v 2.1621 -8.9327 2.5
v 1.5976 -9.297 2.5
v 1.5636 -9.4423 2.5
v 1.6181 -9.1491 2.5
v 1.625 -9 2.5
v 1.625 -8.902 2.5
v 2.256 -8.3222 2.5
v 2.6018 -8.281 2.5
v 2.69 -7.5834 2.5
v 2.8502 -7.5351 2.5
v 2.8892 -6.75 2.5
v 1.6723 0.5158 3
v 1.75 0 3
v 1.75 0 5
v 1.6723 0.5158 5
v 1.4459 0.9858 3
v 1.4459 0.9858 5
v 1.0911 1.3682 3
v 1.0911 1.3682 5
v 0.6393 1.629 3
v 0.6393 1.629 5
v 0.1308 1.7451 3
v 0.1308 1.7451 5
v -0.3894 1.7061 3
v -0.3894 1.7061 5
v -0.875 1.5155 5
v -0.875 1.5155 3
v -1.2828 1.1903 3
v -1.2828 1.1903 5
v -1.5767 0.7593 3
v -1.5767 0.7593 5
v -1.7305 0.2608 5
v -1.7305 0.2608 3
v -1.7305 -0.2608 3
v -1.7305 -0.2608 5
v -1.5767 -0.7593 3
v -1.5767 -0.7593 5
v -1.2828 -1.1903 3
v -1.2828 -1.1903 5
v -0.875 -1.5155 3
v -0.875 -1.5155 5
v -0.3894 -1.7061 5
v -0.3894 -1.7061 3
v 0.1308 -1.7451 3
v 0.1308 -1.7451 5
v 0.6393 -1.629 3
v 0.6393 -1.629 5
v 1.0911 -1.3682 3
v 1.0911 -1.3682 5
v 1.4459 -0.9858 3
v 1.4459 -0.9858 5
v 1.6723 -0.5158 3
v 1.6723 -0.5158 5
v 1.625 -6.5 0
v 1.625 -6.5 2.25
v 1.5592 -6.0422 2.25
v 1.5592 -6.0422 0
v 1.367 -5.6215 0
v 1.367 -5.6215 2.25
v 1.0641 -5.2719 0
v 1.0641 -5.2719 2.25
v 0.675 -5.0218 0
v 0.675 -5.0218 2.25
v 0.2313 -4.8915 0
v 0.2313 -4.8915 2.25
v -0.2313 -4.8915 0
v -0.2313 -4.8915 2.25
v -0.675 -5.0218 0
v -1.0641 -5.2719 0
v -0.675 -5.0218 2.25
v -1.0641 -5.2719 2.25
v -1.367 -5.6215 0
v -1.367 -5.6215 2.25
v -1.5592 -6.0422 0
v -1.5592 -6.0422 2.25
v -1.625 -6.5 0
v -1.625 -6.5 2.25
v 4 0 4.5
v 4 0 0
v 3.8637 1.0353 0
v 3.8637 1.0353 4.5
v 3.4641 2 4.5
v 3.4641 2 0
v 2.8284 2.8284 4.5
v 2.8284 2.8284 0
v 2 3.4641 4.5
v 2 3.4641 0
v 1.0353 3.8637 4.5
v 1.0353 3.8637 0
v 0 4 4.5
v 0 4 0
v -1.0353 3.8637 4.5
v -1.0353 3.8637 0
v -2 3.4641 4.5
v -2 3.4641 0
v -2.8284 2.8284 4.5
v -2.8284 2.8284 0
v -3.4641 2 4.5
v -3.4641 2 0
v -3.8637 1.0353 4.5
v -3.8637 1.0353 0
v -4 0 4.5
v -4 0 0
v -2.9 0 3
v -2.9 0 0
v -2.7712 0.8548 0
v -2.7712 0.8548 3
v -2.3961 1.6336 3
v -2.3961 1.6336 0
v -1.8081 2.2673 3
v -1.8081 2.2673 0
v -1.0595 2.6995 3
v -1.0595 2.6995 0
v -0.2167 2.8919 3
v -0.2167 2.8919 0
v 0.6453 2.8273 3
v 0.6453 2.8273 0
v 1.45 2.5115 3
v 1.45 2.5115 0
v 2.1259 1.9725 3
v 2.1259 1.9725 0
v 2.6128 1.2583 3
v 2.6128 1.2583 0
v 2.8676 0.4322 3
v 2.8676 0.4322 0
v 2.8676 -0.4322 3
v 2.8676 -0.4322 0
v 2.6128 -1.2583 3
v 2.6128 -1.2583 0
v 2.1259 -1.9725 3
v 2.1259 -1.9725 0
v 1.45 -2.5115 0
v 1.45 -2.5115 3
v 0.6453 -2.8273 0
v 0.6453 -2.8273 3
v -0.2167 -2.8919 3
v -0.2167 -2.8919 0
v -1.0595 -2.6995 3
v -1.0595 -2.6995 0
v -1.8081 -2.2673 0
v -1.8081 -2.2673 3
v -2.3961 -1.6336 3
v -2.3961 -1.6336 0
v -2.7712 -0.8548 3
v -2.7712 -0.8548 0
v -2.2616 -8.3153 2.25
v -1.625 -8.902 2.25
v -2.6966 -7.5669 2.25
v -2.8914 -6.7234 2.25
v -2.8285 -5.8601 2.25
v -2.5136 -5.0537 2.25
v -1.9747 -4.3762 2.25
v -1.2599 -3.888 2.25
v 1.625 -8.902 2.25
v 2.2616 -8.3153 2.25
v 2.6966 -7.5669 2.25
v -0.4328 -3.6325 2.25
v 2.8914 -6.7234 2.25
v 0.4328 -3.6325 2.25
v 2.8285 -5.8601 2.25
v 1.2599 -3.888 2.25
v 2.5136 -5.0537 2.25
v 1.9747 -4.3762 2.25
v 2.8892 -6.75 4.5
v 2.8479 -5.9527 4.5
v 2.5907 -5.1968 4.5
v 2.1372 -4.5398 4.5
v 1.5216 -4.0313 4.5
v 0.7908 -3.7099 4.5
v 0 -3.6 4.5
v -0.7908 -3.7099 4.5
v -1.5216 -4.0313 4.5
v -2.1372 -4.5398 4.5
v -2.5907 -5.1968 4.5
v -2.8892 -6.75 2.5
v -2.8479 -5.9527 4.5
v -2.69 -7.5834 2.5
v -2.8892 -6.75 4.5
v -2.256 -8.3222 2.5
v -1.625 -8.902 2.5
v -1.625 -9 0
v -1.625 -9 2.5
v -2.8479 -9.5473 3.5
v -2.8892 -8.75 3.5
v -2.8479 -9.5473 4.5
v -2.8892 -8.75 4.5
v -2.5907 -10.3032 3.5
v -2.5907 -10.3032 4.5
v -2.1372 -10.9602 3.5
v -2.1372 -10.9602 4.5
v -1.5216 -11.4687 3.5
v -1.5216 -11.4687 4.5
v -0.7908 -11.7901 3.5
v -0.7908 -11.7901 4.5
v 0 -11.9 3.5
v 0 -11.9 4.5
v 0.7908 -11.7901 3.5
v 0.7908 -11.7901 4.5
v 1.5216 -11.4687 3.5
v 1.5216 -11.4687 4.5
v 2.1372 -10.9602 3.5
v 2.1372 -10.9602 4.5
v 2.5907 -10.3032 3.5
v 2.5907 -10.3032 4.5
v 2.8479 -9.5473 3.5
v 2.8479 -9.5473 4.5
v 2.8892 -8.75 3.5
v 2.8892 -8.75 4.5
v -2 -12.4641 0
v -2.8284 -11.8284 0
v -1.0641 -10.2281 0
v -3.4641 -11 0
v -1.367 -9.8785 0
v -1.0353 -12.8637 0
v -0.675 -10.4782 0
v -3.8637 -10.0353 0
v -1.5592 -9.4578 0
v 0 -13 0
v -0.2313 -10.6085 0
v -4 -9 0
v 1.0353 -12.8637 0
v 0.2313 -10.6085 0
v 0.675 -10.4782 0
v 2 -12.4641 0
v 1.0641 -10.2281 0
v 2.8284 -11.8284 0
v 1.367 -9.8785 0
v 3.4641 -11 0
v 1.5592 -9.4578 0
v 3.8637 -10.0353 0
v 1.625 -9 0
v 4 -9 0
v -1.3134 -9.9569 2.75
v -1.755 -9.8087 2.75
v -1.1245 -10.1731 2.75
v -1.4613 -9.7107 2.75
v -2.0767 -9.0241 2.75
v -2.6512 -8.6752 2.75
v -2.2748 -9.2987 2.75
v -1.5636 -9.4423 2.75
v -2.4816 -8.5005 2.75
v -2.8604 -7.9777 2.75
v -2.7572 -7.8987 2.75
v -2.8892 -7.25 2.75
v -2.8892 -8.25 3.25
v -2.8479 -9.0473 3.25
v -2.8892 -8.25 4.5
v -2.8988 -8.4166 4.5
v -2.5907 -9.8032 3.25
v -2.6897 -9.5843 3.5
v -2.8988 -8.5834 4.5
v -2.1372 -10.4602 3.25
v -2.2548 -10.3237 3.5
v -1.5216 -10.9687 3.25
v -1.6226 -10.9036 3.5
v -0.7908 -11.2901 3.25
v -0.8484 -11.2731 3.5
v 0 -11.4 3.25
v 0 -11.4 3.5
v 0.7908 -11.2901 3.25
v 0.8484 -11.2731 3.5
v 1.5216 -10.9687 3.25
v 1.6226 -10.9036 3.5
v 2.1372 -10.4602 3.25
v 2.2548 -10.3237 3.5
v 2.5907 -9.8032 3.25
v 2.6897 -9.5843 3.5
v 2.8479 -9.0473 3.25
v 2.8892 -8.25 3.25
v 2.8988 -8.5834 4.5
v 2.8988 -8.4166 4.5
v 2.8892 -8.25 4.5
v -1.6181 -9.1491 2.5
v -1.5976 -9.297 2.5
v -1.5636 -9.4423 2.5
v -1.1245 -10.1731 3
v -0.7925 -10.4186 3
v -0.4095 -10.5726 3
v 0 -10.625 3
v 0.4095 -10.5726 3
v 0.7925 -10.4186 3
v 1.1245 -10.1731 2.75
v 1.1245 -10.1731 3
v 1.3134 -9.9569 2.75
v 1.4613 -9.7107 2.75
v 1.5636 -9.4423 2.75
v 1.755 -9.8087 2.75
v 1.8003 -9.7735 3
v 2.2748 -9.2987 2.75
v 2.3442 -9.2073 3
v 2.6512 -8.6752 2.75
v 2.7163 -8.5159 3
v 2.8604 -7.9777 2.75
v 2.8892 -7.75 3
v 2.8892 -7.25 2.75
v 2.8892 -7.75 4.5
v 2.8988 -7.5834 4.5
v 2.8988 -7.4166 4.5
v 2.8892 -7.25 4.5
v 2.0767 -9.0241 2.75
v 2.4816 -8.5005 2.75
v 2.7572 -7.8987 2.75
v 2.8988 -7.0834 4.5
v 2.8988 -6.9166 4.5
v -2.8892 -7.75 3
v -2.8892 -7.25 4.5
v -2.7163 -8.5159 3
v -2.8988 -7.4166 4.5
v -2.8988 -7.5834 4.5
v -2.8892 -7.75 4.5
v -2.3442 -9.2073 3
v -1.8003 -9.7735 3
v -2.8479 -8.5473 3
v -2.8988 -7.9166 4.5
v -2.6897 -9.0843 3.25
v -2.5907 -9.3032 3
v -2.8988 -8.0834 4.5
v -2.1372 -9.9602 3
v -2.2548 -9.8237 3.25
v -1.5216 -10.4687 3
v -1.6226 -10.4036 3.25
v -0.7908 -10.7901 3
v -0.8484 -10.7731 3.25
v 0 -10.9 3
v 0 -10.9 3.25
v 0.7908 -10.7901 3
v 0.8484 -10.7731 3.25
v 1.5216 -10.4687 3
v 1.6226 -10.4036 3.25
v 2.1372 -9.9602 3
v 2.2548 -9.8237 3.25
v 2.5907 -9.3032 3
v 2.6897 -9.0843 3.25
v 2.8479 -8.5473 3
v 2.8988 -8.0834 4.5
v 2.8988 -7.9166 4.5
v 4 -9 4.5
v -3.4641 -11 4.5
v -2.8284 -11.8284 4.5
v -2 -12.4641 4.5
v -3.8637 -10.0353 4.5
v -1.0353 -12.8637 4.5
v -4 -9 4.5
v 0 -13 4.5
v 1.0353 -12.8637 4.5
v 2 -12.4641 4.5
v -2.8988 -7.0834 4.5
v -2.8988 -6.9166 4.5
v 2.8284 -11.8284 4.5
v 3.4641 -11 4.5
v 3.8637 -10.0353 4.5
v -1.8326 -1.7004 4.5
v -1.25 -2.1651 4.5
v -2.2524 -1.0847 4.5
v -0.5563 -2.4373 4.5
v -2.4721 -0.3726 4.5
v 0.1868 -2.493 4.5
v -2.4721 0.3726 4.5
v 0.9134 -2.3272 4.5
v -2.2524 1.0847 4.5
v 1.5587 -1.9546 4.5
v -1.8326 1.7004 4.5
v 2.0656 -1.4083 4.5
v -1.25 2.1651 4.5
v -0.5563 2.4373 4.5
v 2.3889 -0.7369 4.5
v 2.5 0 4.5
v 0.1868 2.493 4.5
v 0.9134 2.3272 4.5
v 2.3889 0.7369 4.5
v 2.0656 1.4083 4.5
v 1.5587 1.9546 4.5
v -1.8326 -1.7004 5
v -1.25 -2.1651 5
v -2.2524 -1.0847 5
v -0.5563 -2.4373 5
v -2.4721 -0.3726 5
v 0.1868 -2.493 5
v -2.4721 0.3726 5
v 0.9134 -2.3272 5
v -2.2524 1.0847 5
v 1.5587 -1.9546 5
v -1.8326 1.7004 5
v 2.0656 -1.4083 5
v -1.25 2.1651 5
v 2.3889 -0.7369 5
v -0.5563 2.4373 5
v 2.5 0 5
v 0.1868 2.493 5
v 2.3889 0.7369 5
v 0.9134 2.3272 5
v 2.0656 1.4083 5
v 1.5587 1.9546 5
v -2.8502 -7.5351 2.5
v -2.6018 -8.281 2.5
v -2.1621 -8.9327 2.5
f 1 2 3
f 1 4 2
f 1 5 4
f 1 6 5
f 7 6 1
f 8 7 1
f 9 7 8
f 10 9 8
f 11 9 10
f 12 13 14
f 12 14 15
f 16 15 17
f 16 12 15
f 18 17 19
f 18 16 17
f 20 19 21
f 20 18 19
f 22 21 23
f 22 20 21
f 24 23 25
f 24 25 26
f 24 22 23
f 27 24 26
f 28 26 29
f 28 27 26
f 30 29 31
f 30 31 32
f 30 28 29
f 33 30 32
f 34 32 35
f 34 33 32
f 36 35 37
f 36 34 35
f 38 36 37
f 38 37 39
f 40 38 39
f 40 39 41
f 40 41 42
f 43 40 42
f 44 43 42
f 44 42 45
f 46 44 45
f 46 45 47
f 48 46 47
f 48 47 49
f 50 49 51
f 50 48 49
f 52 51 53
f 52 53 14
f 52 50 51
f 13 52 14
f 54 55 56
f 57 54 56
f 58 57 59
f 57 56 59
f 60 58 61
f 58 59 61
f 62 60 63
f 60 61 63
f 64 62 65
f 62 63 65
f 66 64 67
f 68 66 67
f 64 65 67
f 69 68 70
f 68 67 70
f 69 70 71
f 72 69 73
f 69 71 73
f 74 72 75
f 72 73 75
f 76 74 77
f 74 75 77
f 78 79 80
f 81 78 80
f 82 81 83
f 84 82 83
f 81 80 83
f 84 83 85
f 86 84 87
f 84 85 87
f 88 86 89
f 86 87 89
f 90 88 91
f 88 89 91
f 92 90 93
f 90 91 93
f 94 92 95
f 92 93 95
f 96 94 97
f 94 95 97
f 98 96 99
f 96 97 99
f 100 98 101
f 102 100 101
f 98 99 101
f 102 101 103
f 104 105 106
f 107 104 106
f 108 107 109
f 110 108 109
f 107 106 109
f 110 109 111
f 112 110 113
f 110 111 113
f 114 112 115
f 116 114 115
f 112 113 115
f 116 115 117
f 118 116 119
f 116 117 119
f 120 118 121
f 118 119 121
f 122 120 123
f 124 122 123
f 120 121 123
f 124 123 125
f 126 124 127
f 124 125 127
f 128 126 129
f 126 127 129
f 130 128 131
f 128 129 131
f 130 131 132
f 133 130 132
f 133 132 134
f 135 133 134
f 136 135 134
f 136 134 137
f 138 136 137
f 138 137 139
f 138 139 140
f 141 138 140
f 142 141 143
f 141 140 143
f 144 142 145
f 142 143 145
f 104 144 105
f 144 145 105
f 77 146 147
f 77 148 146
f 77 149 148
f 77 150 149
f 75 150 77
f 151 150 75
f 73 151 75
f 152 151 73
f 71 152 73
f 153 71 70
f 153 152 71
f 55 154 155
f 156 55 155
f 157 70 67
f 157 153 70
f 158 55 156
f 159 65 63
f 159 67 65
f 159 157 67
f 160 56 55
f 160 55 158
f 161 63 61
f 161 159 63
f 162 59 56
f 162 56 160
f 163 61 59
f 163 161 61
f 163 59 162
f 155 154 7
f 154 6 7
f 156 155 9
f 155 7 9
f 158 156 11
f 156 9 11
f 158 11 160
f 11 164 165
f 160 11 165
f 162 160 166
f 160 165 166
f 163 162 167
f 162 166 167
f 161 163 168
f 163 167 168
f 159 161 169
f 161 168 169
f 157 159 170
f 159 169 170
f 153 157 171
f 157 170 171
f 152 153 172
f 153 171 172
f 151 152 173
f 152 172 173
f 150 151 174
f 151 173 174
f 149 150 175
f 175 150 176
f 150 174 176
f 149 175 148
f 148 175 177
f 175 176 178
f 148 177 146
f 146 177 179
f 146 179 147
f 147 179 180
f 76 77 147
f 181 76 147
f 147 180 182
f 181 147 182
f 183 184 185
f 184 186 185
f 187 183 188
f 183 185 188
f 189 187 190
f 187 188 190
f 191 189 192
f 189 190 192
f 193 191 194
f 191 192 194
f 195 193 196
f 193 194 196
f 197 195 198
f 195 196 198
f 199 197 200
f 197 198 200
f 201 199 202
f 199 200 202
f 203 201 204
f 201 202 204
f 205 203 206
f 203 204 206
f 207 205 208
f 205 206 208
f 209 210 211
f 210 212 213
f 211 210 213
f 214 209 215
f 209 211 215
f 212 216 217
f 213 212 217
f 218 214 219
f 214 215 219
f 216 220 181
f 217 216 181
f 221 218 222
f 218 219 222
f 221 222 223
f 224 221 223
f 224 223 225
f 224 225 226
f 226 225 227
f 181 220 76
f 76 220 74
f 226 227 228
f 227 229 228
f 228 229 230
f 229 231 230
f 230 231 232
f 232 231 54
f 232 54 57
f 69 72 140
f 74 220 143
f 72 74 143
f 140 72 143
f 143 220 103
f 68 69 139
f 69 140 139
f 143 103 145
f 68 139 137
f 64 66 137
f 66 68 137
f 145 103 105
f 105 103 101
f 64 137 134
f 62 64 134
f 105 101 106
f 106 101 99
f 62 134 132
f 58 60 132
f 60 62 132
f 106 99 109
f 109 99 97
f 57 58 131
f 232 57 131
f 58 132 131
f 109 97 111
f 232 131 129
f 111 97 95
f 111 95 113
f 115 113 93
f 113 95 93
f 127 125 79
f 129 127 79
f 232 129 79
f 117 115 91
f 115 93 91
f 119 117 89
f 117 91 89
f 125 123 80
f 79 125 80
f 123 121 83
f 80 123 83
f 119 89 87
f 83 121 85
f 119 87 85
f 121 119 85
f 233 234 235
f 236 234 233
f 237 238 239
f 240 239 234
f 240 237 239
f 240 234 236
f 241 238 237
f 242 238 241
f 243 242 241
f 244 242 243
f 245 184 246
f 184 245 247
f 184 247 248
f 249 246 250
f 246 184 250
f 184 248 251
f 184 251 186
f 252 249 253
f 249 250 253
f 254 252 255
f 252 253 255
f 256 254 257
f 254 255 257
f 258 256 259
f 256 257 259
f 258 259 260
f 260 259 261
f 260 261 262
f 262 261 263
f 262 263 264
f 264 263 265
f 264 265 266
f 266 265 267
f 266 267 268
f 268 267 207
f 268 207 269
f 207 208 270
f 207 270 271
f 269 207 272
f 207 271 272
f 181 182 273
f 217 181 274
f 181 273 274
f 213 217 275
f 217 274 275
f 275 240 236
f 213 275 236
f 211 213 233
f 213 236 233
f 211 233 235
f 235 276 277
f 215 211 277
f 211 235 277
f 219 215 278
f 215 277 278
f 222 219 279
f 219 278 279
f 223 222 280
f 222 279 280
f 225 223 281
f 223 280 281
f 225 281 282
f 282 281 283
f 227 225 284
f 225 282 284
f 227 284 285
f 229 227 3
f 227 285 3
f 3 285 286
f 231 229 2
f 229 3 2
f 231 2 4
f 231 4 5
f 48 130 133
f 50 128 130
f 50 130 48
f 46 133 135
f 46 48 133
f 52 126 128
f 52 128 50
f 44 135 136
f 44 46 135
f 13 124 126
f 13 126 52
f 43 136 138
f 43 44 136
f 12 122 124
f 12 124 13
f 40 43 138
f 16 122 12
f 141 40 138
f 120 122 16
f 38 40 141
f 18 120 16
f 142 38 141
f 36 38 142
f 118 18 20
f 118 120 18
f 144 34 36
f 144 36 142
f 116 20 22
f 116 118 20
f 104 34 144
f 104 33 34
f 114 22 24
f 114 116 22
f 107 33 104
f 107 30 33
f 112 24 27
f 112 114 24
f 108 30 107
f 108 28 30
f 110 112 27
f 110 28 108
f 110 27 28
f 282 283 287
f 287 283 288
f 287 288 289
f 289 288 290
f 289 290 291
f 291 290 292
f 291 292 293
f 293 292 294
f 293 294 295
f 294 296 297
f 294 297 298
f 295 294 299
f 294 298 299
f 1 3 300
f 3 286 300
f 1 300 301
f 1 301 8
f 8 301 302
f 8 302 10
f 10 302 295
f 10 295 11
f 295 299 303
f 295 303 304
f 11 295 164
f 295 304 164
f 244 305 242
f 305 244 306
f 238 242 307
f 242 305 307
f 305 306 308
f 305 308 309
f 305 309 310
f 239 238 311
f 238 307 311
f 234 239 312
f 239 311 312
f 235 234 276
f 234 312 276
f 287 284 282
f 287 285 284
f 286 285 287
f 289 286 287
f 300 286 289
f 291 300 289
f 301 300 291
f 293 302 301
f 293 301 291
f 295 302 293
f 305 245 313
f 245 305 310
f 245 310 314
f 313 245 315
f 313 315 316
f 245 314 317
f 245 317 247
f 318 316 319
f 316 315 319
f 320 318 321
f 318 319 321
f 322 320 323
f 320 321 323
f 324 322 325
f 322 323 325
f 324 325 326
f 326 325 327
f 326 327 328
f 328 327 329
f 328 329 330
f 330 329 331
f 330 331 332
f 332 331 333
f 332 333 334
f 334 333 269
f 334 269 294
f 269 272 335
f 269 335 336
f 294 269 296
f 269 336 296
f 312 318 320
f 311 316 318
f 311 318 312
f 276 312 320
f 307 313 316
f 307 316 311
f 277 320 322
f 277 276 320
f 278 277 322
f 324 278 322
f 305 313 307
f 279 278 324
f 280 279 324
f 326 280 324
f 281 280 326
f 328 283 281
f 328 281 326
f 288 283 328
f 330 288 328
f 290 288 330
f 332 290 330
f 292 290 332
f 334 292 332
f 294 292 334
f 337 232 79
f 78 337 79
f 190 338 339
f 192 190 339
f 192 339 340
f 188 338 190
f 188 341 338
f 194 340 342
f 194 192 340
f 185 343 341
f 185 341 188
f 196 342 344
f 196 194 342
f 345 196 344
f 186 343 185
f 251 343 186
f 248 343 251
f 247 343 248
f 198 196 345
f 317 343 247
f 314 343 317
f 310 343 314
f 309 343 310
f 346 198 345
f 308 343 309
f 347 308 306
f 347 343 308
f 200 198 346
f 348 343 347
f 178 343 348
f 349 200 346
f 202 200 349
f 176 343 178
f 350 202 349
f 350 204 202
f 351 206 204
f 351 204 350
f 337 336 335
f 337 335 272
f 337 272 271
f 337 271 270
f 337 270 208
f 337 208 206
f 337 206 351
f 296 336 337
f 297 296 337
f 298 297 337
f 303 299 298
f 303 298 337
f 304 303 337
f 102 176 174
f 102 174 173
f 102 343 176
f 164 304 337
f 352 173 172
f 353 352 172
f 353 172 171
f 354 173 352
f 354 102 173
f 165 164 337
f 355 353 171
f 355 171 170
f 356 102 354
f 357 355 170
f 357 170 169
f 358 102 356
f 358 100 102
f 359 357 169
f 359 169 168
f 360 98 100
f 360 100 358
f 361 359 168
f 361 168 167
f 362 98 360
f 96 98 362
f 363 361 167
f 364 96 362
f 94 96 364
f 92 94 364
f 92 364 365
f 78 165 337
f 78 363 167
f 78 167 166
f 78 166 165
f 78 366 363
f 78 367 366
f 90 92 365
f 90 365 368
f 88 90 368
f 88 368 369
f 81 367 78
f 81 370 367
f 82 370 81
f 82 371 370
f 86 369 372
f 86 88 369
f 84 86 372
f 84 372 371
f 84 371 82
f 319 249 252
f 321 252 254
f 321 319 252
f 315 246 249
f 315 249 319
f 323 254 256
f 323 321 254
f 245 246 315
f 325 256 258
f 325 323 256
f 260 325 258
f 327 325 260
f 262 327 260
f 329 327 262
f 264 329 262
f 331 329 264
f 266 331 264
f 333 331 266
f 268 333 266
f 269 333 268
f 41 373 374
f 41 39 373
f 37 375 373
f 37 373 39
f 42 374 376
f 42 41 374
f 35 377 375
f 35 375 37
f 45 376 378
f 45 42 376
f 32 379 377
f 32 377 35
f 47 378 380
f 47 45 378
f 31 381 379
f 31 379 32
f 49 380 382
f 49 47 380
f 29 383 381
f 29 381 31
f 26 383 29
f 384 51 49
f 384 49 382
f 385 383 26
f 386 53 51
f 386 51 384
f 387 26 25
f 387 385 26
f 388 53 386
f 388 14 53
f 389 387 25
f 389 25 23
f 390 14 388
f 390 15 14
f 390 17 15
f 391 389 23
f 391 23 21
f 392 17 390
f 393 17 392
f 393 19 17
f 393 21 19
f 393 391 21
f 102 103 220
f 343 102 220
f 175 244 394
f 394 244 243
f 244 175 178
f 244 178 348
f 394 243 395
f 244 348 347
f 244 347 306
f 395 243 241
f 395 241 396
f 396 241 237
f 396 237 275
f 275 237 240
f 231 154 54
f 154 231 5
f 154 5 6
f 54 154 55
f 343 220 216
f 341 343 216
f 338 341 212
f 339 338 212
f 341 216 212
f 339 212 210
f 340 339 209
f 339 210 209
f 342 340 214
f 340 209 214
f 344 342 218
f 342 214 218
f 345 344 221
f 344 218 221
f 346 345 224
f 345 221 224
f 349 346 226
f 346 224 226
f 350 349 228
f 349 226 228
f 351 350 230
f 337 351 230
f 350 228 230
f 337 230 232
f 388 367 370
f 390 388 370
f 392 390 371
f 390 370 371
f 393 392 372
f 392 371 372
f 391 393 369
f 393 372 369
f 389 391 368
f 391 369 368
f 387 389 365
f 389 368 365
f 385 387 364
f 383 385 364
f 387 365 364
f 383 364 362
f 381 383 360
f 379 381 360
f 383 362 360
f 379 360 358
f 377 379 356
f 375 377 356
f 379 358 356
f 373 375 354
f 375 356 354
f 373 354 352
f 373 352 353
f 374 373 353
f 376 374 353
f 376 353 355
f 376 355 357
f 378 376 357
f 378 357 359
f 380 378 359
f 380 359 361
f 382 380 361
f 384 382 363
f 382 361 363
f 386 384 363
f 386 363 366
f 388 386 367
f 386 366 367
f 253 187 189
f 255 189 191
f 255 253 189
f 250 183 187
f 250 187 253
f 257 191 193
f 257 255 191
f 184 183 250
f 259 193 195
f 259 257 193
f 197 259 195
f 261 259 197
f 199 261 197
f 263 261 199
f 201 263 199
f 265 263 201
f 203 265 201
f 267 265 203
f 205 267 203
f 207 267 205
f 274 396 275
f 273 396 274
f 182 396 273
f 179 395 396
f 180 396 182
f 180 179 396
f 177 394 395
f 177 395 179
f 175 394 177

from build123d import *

# Parameters (mm, degrees)
ESBO_O1_R                = 1.75
RESSALTO_EXTRUS_O1_DEPTH = 4.5
ESBO_O2_R                = 2.5
ESBO_O2_R_2              = 1.75
RESSALTO_EXTRUS_O2_DEPTH = 0.5
CORTE_EXTRUS_O1_DEPTH    = 15.326548782
ESBO_O4_R                = 2.9
CORTE_EXTRUS_O2_DEPTH    = 1
ESBO_O5_R                = 2.9
CORTE_EXTRUS_O3_DEPTH    = 1.25
ESBO_O6_R                = 2.9
CORTE_EXTRUS_O4_DEPTH    = 1.5
ESBO_O7_R                = 2.9
CORTE_EXTRUS_O5_DEPTH    = 1.75
ESBO_O8_R                = 2.9
CORTE_EXTRUS_O6_DEPTH    = 2
ESBO_O9_R                = 2.9
CORTE_EXTRUS_O7_DEPTH    = 2.25
ESBO_O10_R               = 2.9
CORTE_EXTRUS_O8_DEPTH    = 3


with BuildPart() as part:
    # Esboço1 → Ressalto-extrusão1 (new body)
    with BuildSketch(Plane.XY):
        with BuildLine():
            Line((-4, 0), (-4, -9))
            ThreePointArc((-4, -9), (0, -13), (4, -9))
            Line((4, -9), (4, 0))
            ThreePointArc((4, 0), (0, 4), (-4, 0))
        make_face()
        Circle(ESBO_O1_R, mode=Mode.SUBTRACT)
    extrude(amount=RESSALTO_EXTRUS_O1_DEPTH)

    # Esboço2 → Ressalto-extrusão2 (add)
    with BuildSketch(Plane.XY.offset(4.5)):
        Circle(ESBO_O2_R)
        Circle(ESBO_O2_R_2, mode=Mode.SUBTRACT)
    extrude(amount=RESSALTO_EXTRUS_O2_DEPTH)

    # Esboço3 → Corte-extrusão1 (cut, through all)
    with BuildSketch(Plane.XY.offset(4.5)):
        with BuildLine():
            Line((-1.625, -6.5), (-1.625, -9))
            ThreePointArc((-1.625, -9), (0, -10.625), (1.625, -9))
            Line((1.625, -9), (1.625, -6.5))
            ThreePointArc((1.625, -6.5), (0, -4.875), (-1.625, -6.5))
        make_face()
    extrude(amount=-CORTE_EXTRUS_O1_DEPTH, mode=Mode.SUBTRACT)

    # Esboço4 → Corte-extrusão2 (cut)
    with BuildSketch(Plane.XY.offset(4.5)):
        with Locations((0, -9)):
            Circle(ESBO_O4_R)
    extrude(amount=-CORTE_EXTRUS_O2_DEPTH, mode=Mode.SUBTRACT)

    # Esboço5 → Corte-extrusão3 (cut)
    with BuildSketch(Plane.XY.offset(4.5)):
        with Locations((0, -8.5)):
            Circle(ESBO_O5_R)
    extrude(amount=-CORTE_EXTRUS_O3_DEPTH, mode=Mode.SUBTRACT)

    # Esboço6 → Corte-extrusão4 (cut)
    with BuildSketch(Plane.XY.offset(4.5)):
        with Locations((0, -8)):
            Circle(ESBO_O6_R)
    extrude(amount=-CORTE_EXTRUS_O4_DEPTH, mode=Mode.SUBTRACT)

    # Esboço7 → Corte-extrusão5 (cut)
    with BuildSketch(Plane.XY.offset(4.5)):
        with Locations((0, -7.5)):
            Circle(ESBO_O7_R)
    extrude(amount=-CORTE_EXTRUS_O5_DEPTH, mode=Mode.SUBTRACT)

    # Esboço8 → Corte-extrusão6 (cut)
    with BuildSketch(Plane.XY.offset(4.5)):
        with Locations((0, -7)):
            Circle(ESBO_O8_R)
    extrude(amount=-CORTE_EXTRUS_O6_DEPTH, mode=Mode.SUBTRACT)

    # Esboço9 → Corte-extrusão7 (cut)
    with BuildSketch(Plane.XY.offset(4.5)):
        with Locations((0, -6.5)):
            Circle(ESBO_O9_R)
    extrude(amount=-CORTE_EXTRUS_O7_DEPTH, mode=Mode.SUBTRACT)

    # Esboço10 → Corte-extrusão8 (cut)
    with BuildSketch(Plane(origin=(0, 0, 0), x_dir=(-1, 0, 0), z_dir=(0, 0, -1))):
        Circle(ESBO_O10_R)
    extrude(amount=-CORTE_EXTRUS_O8_DEPTH, mode=Mode.SUBTRACT)


solid = part.part
